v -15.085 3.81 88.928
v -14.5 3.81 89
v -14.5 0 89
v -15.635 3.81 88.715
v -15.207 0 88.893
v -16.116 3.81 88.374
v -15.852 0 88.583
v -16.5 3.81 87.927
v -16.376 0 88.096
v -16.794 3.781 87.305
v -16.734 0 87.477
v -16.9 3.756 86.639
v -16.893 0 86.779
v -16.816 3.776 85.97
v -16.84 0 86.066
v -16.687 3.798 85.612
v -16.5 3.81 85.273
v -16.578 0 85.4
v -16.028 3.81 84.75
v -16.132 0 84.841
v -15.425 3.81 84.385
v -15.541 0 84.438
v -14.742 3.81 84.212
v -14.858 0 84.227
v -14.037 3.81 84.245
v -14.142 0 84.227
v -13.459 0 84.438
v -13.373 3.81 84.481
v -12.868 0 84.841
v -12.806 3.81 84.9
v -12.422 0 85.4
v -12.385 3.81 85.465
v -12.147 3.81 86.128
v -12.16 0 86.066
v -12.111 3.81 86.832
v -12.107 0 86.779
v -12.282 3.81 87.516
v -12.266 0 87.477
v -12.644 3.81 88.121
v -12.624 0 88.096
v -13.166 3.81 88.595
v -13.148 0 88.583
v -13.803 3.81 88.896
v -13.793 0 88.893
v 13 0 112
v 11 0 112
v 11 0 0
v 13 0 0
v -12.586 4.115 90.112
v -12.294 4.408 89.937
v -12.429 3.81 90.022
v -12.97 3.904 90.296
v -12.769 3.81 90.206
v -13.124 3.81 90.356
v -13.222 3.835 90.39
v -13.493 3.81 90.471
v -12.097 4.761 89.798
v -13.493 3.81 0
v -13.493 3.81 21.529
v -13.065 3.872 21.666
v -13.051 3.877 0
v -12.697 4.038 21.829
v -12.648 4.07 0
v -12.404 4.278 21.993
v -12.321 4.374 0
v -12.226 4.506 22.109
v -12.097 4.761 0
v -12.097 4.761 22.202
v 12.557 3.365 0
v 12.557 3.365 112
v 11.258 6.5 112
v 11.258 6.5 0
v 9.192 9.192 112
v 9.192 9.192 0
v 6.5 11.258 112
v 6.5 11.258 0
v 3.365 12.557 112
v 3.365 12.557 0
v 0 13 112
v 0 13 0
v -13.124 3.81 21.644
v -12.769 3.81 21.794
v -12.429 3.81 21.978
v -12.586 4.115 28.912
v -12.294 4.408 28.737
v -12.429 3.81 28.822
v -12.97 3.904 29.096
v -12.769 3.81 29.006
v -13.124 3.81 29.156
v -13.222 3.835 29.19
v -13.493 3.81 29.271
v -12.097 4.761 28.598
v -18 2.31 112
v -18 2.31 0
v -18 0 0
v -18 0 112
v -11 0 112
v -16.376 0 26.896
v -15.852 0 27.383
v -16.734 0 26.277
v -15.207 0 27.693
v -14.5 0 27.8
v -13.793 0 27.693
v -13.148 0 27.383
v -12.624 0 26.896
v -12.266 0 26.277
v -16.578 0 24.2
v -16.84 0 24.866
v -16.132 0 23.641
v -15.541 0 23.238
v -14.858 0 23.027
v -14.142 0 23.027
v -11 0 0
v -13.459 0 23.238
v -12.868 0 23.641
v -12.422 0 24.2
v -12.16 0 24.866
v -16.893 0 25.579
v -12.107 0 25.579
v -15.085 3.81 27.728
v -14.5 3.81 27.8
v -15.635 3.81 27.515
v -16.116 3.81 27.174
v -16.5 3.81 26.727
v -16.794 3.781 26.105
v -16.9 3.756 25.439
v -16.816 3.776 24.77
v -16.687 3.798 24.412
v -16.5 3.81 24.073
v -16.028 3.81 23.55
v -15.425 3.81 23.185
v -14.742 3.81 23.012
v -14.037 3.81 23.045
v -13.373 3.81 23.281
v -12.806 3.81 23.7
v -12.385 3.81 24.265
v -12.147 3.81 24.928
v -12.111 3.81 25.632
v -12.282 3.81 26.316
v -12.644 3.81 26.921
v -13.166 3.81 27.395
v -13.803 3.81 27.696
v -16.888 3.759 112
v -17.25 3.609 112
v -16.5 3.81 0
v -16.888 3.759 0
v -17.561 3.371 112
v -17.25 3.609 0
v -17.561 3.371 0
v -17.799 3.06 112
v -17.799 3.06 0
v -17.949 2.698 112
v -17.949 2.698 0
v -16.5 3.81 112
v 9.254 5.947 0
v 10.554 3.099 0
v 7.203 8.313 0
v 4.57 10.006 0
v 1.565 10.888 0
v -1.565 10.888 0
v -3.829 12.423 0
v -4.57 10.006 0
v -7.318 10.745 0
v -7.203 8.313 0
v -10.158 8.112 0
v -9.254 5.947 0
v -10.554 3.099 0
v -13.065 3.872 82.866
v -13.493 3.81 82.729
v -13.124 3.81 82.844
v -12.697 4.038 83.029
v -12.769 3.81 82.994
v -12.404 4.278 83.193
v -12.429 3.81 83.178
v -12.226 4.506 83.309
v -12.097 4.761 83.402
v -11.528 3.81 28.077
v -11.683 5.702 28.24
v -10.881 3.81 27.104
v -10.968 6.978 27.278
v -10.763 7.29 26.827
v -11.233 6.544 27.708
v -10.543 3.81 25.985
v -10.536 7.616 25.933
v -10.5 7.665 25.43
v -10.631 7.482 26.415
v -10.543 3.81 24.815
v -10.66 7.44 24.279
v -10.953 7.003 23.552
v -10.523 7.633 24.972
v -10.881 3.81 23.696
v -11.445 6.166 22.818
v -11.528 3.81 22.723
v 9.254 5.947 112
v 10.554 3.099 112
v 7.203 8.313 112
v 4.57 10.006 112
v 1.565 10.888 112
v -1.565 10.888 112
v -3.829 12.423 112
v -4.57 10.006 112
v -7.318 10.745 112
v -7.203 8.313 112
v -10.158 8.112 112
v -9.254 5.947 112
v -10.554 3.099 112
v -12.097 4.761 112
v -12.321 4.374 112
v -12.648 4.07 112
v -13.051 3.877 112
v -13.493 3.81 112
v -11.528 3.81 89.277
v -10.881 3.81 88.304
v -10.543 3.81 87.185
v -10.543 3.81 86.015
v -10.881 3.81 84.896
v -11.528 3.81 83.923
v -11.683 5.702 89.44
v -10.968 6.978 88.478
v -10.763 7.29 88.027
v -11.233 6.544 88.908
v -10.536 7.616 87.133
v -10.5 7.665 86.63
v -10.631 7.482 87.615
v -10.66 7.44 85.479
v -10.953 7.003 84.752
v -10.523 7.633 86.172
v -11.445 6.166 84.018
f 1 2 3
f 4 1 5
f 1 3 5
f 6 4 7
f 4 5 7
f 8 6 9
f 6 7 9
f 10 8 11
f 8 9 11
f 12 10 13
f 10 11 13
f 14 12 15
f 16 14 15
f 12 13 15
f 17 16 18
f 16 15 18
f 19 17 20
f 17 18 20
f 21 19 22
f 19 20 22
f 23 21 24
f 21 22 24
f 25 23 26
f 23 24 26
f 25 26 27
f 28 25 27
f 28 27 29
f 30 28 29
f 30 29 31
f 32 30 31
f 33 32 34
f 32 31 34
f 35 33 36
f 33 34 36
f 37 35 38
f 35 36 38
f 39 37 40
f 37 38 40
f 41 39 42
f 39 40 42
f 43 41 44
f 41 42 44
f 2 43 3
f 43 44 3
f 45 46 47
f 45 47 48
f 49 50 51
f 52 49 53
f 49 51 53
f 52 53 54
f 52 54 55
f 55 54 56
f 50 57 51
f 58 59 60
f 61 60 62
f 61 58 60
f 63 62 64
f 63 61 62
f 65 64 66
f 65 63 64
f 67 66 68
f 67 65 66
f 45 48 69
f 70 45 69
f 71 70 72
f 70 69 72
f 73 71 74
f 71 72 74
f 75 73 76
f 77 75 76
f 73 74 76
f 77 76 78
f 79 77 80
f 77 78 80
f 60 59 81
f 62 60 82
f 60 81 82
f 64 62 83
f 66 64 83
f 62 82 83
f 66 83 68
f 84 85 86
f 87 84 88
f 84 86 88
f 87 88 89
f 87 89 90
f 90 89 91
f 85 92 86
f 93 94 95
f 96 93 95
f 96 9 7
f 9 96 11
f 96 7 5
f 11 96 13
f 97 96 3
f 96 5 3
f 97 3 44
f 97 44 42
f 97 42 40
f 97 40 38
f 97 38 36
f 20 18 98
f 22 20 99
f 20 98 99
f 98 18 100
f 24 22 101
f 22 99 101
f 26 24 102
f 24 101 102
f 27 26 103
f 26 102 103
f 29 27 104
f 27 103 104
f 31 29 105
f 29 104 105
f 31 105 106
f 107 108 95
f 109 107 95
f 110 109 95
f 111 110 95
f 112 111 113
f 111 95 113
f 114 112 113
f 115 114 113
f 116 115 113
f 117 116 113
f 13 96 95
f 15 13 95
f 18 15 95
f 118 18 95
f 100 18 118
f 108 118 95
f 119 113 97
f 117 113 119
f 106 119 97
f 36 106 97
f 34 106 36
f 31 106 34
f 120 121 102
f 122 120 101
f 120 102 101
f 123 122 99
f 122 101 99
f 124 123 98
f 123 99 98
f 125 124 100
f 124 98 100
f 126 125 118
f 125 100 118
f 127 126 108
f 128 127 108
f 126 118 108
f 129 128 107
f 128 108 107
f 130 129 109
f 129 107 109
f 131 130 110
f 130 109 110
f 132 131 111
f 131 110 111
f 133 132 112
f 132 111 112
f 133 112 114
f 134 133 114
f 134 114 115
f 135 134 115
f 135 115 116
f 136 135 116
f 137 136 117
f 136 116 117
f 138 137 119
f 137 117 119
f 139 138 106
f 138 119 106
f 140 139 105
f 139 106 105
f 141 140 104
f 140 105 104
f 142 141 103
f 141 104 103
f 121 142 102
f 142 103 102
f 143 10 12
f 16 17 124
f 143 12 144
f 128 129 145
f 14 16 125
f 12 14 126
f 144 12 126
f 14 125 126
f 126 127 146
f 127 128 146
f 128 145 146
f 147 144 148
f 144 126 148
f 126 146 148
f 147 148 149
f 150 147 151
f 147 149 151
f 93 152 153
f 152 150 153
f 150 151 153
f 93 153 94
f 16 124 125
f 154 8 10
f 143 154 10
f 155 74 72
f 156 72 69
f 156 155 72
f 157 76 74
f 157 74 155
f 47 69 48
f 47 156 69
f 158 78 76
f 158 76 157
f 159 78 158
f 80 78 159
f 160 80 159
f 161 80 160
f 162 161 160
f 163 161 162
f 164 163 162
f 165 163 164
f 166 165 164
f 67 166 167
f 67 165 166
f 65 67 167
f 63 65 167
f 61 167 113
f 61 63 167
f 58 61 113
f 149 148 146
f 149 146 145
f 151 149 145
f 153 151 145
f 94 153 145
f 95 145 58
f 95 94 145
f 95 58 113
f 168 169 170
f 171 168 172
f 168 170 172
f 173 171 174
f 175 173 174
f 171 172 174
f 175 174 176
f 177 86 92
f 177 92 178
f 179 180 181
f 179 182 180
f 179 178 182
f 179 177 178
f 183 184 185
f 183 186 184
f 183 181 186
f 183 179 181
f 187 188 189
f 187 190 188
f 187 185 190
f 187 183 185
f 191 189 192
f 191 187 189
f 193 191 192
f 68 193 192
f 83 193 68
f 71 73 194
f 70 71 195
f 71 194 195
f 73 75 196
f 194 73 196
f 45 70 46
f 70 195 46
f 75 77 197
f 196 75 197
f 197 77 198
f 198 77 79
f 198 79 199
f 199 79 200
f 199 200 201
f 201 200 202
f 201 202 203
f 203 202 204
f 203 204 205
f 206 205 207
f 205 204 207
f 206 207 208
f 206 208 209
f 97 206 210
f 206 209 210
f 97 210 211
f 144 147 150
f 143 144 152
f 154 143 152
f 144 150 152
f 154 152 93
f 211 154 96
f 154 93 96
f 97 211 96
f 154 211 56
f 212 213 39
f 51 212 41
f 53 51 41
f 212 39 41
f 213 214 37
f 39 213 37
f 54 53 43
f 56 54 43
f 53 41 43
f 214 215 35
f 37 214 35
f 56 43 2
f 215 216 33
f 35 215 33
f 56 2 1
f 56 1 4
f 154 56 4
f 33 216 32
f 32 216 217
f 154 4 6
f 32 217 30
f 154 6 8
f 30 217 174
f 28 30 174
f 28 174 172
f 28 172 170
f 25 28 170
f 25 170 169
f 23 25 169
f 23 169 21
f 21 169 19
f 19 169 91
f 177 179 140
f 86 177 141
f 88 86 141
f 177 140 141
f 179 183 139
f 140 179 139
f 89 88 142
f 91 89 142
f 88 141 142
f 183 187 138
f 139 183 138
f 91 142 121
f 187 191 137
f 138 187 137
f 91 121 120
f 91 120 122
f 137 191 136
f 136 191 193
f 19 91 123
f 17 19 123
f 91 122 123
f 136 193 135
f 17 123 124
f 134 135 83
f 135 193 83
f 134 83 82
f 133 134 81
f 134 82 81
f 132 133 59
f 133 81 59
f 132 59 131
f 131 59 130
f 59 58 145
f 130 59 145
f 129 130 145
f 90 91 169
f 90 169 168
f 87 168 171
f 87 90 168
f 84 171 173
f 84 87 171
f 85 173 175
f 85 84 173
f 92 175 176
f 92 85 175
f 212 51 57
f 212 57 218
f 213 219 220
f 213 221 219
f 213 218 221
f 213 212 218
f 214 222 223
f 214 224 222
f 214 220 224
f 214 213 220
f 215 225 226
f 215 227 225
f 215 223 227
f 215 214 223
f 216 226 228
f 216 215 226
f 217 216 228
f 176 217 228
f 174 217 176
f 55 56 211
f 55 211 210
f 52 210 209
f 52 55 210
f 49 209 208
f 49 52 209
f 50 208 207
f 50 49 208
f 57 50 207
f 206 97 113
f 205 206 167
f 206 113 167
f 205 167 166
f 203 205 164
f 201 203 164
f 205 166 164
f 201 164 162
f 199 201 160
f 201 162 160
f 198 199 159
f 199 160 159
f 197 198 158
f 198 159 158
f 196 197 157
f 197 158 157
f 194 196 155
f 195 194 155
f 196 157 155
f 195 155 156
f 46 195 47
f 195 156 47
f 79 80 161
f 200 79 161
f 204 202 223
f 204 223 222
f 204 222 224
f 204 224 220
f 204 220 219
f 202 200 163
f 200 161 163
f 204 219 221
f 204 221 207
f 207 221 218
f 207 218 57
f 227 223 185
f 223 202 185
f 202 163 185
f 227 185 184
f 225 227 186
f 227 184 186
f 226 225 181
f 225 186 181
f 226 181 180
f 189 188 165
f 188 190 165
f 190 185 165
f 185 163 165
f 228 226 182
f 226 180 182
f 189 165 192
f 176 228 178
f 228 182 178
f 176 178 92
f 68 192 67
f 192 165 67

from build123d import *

# Parameters (mm, degrees)
BOSS_EXTRUDE1_DEPTH           = 112
SKETCH6_W                     = 2.4
SKETCH6_H                     = 3.81
M4_CLEARANCE_HOLE2_AT_2_COUNT = 2
M4_CLEARANCE_HOLE2_AT_2_PITCH = 61.2
SKETCH7_R                     = 4
CUT_EXTRUDE1_DEPTH            = 114.80885774
FILLET1_R                     = 1.5


with BuildPart() as part:
    # Sketch1 → Boss-Extrude1 (new body)
    with BuildSketch(Plane.XY):
        with BuildLine():
            ThreePointArc((-12.429155241, 3.81), (-12.856496765, 1.926263465), (-13, 0))
            Line((-13, 0), (-11, 0))
            ThreePointArc((-11, 0), (0, 11), (11, 0))
            Line((11, 0), (13, 0))
            ThreePointArc((13, 0), (9.192388155, 9.192388155), (0, 13))
            ThreePointArc((0, 13), (-7.728842087, 10.452990003), (-12.429155241, 3.81))
        make_face()
        with BuildLine():
            Line((-18, 0), (-13, 0))
            ThreePointArc((-13, 0), (-12.856496765, 1.926263465), (-12.429155241, 3.81))
            Line((-12.429155241, 3.81), (-18, 3.81))
            Line((-18, 3.81), (-18, 0))
        make_face()
    extrude(amount=BOSS_EXTRUDE1_DEPTH)

    # Sketch6 → M4 Clearance Hole2 (revolve, cut)
    with BuildSketch(Plane(origin=(-14.5, 3.81, 86.6), x_dir=(0, 0, 1), z_dir=(1, 0, 0))):
        with Locations((1.2, 1.905)):
            Rectangle(SKETCH6_W, SKETCH6_H)
    m4_clearance_hole2 = revolve(axis=Axis((-14.5, 10.16, 86.6), (0, -1, 0)), mode=Mode.SUBTRACT)

    # M4 Clearance Hole2 at 2: M4 Clearance Hole2 ×2
    with Locations(*[(0, 0, -i * M4_CLEARANCE_HOLE2_AT_2_PITCH) for i in range(1, M4_CLEARANCE_HOLE2_AT_2_COUNT)]):
        add(m4_clearance_hole2, mode=Mode.SUBTRACT)

    # Sketch7 → Cut-Extrude1 (cut, through all)
    with BuildSketch(Plane(origin=(0, 3.81, 0), x_dir=(1, 0, 0), z_dir=(0, 1, 0))):
        with Locations((-14.5, -25.4)):
            Circle(SKETCH7_R)
        with Locations((-14.5, -86.6)):
            Circle(SKETCH7_R)
    extrude(amount=CUT_EXTRUDE1_DEPTH, mode=Mode.SUBTRACT)

    # Fillet1
    # the kernel refuses this fillet: 1.5 mm, written as the material it adds along each edge
    with BuildSketch(Plane(origin=(-12.429155241, 3.81, 87.363272187), x_dir=(0.32988946400333646, 0.9440195662906523, 0), z_dir=(0, 0, 1))) as fillet1_piece_1_section:
        with BuildLine():
            CenterArc((1.065165566, 1.498874377), FILLET1_R, 199.262066546, 68.518123934)
            Line((-0.350863784, 1.004040181), (0, 0))
            ThreePointArc((0, 0), (0.503532813, 0.009755402), (1.007065626, 0))
        make_face()
    fillet1_piece_1 = extrude(amount=24.636727813, mode=Mode.PRIVATE)
    fillet1_piece_1 = fillet1_piece_1 - Plane(origin=(-14.5, 4.019727469, 86.6), x_dir=(1, 0, 0), z_dir=(0, -1, 0)) * Cylinder(4, 54, mode=Mode.PRIVATE)
    add(fillet1_piece_1)
    with BuildSketch(Plane(origin=(-12.429155241, 3.81, 26.163272187), x_dir=(0.32988946400333646, 0.9440195662906523, 0), z_dir=(0, 0, 1))) as fillet1_piece_2_section:
        with BuildLine():
            CenterArc((1.065165566, 1.498874377), FILLET1_R, 199.262066546, 68.518123934)
            Line((-0.350863784, 1.004040181), (0, 0))
            ThreePointArc((0, 0), (0.503532813, 0.009755402), (1.007065626, 0))
        make_face()
    fillet1_piece_2 = extrude(amount=59.673455626, mode=Mode.PRIVATE)
    fillet1_piece_2 = fillet1_piece_2 - Plane(origin=(-14.5, 4.019506005, 86.6), x_dir=(1, 0, 0), z_dir=(0, -1, 0)) * Cylinder(4, 124, mode=Mode.PRIVATE)
    fillet1_piece_2 = fillet1_piece_2 - Plane(origin=(-14.5, 4.019506005, 25.4), x_dir=(1, 0, 0), z_dir=(0, -1, 0)) * Cylinder(4, 124, mode=Mode.PRIVATE)
    add(fillet1_piece_2)
    with BuildSketch(Plane(origin=(-12.429155241, 3.81, 0), x_dir=(0.3298894640033357, 0.9440195662906526, 0), z_dir=(0, 0, 1))) as fillet1_piece_3_section:
        with BuildLine():
            CenterArc((1.065165566, 1.498874377), FILLET1_R, 199.262066546, 68.518123934)
            Line((-0.350863784, 1.004040181), (0, 0))
            ThreePointArc((0, 0), (0.503532813, 0.009755402), (1.007065626, 0))
        make_face()
    fillet1_piece_3 = extrude(amount=24.636727813, mode=Mode.PRIVATE)
    fillet1_piece_3 = fillet1_piece_3 - Plane(origin=(-14.5, 4.019727315, 25.4), x_dir=(1, 0, 0), z_dir=(0, -1, 0)) * Cylinder(4, 54, mode=Mode.PRIVATE)
    add(fillet1_piece_3)
    # the kernel refuses this fillet: 1.5 mm, written as the material it takes off along each edge
    with BuildSketch(Plane(origin=(-18, 3.81, -3.75), x_dir=(1, 0, 0), z_dir=(0, 0, 1))) as fillet1_2_piece_1:
        with BuildLine():
            CenterArc((FILLET1_R, -FILLET1_R), FILLET1_R, 90, 90)
            Line((0, -FILLET1_R), (0, 0))
            Line((0, 0), (FILLET1_R, 0))
        make_face()
    extrude(amount=119.5, mode=Mode.SUBTRACT)


solid = part.part
